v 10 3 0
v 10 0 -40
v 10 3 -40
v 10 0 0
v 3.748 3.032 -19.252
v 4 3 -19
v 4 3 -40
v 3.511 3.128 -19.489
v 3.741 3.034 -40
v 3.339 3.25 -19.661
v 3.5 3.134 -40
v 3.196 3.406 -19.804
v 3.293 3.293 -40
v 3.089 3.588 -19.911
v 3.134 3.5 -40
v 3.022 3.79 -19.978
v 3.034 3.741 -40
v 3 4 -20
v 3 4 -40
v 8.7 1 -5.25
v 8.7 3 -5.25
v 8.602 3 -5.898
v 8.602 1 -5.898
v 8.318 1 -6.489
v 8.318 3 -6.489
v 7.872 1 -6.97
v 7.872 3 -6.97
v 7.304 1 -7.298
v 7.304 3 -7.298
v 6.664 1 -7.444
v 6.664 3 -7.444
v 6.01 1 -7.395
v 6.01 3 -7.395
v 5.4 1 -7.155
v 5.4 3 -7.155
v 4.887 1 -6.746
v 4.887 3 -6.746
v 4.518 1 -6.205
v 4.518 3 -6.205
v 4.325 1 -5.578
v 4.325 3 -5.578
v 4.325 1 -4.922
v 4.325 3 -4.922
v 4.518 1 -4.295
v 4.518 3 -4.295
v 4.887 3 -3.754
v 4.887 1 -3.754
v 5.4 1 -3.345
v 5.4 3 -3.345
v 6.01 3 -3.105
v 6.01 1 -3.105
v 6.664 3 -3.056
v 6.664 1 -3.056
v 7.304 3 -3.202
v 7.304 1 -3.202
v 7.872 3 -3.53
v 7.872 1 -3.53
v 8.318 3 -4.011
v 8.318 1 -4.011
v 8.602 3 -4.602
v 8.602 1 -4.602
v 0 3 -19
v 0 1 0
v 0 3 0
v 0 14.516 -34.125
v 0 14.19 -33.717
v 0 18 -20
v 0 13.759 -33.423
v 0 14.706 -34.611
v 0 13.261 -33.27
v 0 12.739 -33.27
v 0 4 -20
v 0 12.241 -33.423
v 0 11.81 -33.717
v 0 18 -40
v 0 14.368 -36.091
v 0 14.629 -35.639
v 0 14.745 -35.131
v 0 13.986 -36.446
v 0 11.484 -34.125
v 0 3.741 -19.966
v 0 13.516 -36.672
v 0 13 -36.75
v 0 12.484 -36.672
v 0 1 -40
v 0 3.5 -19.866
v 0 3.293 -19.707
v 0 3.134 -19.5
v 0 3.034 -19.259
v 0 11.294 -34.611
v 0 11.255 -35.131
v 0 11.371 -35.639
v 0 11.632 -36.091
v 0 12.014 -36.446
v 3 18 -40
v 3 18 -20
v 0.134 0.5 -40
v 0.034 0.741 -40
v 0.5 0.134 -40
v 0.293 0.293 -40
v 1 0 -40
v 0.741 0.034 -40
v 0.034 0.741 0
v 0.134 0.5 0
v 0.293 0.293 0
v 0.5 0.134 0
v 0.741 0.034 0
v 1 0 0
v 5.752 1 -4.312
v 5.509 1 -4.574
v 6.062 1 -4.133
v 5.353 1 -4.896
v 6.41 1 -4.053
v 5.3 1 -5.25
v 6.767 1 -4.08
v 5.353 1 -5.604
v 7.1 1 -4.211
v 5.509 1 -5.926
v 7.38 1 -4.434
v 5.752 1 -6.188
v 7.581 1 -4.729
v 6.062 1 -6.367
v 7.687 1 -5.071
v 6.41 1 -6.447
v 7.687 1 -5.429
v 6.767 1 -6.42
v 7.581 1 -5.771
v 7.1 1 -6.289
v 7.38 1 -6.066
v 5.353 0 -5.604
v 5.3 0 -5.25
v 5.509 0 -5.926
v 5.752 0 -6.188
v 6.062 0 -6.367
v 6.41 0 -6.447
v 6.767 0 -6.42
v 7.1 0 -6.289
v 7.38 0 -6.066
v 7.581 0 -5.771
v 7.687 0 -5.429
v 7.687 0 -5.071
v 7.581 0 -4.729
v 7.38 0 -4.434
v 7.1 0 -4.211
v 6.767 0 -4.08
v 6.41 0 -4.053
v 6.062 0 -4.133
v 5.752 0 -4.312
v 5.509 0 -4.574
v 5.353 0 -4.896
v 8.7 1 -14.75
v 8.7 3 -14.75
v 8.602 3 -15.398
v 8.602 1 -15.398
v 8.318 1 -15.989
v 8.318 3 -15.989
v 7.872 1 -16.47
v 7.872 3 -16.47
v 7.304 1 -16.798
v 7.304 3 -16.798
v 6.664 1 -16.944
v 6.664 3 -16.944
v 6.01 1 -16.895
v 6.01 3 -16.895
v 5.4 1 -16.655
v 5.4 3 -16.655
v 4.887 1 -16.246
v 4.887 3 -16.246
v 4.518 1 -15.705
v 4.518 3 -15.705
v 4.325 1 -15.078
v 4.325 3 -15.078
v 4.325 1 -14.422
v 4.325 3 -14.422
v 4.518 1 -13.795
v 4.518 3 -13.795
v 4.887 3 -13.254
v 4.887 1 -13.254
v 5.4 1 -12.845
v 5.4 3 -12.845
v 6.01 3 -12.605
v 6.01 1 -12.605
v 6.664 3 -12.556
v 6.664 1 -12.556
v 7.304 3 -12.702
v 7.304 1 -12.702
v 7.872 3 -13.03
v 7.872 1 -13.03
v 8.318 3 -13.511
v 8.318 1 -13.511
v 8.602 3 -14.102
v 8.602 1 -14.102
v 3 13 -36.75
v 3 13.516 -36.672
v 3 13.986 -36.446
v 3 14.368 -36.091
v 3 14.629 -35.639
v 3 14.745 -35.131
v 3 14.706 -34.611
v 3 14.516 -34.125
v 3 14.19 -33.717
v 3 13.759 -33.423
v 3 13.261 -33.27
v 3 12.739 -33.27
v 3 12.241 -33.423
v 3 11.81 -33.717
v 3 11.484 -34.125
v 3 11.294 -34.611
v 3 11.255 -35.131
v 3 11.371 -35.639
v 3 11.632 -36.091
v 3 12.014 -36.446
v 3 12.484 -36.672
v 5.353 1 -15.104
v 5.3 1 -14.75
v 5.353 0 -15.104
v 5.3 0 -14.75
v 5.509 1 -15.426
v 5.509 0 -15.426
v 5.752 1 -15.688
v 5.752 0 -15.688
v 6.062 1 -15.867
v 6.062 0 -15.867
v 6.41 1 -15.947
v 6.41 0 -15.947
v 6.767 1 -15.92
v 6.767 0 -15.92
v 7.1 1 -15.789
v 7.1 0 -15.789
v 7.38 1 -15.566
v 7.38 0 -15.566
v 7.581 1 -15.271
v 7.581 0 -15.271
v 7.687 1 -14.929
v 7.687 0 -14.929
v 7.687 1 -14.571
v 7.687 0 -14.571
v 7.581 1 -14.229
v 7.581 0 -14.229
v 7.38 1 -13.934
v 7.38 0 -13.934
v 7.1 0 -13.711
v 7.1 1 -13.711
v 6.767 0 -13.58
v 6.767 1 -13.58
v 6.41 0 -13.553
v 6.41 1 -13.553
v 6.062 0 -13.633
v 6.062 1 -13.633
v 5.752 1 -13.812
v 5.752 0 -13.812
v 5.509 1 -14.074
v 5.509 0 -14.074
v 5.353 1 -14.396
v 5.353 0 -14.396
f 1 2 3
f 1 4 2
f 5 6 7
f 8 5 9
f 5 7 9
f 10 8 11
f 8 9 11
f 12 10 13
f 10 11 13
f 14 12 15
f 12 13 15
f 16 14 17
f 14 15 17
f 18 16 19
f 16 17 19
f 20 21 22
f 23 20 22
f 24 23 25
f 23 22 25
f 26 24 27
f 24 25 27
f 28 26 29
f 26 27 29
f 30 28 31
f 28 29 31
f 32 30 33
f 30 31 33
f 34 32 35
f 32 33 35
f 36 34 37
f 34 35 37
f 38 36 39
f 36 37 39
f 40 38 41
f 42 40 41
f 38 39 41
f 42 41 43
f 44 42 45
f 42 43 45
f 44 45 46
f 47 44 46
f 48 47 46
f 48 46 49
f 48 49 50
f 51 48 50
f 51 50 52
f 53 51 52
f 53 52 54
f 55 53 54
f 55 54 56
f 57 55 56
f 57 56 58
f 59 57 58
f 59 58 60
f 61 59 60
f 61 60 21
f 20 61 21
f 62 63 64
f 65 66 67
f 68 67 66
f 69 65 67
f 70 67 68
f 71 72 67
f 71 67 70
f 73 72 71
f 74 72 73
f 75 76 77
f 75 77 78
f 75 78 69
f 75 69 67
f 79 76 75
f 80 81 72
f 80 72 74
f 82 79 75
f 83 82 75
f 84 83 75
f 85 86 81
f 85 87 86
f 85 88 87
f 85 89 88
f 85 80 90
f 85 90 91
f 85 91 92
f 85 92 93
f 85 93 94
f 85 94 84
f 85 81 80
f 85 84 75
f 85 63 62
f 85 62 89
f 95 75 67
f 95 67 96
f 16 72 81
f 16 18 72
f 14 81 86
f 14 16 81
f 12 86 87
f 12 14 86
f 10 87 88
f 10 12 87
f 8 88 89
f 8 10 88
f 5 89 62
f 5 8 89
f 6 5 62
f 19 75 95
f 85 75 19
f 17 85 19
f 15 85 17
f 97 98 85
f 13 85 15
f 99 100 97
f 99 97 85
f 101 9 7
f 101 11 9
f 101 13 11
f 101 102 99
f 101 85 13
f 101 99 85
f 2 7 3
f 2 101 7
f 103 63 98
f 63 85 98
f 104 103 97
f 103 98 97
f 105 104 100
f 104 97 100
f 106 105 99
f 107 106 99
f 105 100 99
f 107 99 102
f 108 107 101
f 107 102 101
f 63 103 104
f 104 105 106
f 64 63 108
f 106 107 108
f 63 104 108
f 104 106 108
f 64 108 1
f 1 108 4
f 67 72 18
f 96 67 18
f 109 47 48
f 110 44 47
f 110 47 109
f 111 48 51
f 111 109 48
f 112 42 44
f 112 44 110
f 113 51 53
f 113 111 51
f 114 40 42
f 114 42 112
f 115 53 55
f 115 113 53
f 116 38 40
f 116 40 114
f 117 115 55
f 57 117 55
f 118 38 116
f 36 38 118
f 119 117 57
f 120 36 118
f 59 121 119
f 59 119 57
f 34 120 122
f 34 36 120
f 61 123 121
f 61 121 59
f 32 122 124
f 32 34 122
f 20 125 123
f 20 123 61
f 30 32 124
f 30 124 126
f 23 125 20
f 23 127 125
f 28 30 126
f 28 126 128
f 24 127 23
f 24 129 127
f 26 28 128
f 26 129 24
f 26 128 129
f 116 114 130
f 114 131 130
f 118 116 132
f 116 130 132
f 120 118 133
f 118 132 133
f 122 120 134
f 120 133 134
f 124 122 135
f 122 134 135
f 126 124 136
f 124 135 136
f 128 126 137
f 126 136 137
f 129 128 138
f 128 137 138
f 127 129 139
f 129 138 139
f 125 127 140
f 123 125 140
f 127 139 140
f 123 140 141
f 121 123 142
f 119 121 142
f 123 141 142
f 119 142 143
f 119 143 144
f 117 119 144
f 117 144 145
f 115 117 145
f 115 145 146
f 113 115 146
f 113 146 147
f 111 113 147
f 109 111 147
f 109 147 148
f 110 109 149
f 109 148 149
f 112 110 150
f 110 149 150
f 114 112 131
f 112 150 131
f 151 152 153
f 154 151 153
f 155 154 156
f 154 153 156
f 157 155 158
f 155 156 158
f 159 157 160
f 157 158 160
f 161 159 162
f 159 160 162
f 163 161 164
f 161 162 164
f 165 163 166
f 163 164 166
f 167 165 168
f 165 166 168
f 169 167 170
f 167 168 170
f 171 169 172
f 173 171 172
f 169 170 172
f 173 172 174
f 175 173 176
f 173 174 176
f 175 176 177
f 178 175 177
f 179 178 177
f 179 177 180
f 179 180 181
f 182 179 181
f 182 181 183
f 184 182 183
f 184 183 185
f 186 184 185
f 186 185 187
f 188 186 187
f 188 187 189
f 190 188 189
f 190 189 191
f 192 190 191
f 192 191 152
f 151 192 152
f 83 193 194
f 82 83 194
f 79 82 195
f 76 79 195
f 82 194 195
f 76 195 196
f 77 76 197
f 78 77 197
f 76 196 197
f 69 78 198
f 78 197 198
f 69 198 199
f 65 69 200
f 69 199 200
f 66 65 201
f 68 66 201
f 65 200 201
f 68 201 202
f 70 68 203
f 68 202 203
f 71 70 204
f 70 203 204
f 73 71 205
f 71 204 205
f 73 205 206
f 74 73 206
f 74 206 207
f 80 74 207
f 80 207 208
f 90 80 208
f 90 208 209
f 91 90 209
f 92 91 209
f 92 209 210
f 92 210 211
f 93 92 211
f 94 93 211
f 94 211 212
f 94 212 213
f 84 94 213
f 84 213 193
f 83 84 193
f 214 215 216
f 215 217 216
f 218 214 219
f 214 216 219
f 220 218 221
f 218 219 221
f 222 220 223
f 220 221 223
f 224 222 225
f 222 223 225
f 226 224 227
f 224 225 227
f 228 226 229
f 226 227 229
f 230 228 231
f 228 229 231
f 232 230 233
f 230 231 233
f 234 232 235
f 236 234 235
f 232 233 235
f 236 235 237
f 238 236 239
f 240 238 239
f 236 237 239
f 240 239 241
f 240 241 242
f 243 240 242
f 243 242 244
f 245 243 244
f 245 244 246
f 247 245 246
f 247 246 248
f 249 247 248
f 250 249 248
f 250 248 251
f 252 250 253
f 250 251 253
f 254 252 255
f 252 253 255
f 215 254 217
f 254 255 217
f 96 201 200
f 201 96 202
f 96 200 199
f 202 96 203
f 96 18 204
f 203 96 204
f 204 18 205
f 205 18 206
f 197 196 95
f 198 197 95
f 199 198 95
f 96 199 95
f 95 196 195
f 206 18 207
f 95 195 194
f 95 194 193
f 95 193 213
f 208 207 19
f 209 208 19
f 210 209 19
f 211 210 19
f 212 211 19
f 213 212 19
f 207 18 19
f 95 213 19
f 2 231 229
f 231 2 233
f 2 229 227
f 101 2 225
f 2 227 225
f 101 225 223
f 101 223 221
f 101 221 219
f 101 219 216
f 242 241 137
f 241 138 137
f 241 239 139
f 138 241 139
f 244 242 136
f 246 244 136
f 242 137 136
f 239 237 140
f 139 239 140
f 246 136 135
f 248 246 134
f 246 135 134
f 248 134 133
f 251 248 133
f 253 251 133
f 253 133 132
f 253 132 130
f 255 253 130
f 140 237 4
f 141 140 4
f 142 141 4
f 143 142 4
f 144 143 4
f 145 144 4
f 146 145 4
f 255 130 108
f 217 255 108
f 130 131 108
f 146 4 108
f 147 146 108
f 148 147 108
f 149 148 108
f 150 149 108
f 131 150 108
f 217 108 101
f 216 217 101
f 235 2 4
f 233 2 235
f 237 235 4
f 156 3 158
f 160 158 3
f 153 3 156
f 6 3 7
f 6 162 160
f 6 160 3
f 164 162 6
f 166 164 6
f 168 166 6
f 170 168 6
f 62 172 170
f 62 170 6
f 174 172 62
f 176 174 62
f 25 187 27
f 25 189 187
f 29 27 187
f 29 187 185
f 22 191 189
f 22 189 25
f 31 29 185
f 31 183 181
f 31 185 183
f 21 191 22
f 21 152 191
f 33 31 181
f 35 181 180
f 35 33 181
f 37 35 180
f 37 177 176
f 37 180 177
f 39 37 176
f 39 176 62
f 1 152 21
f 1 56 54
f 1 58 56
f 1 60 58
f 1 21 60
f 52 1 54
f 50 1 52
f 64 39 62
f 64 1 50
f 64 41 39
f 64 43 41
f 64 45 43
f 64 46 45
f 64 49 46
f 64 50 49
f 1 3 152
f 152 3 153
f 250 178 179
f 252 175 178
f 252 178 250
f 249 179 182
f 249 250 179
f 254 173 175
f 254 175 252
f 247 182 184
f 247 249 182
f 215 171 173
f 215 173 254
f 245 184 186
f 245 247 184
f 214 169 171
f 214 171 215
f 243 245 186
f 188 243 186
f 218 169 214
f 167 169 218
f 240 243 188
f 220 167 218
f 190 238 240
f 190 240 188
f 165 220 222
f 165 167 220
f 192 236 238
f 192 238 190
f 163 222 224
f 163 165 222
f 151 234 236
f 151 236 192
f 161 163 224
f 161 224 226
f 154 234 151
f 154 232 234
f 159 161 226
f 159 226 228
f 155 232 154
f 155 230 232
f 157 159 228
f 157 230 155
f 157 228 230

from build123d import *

# Parameters (mm, degrees)
SKETCH1_W                      = 10
SKETCH1_H                      = 20
SKETCH1_R                      = 1.175
BOSS_EXTRUDE1_DEPTH            = 3
CBORE_FOR_M2_SHCS1_D           = 2.4
CBORE_FOR_M2_SHCS1_CBORE_D     = 4.4
CBORE_FOR_M2_SHCS1_CBORE_DEPTH = 2
SKETCH6_W                      = 10
SKETCH6_H                      = 3
BOSS_EXTRUDE2_DEPTH            = 20
SKETCH8_W                      = 3
SKETCH8_H                      = 20
BOSS_EXTRUDE3_DEPTH            = 15
SKETCH9_R                      = 1.75
CUT_EXTRUDE1_DEPTH             = 45.418464629
FILLET1_R                      = 1
FILLET2_R                      = 1


with BuildPart() as part:
    # Sketch1 → Boss-Extrude1 (new body)
    with BuildSketch(Plane(origin=(0, 0, 0), x_dir=(1, 0, 0), z_dir=(0, 1, 0))):
        with Locations((5, 10)):
            Rectangle(SKETCH1_W, SKETCH1_H)
        with Locations(Location((6.5, 5.25, 0), (0, 0, 270))):
            Circle(SKETCH1_R, mode=Mode.SUBTRACT)
        with Locations(Location((6.5, 14.75, 0), (0, 0, 270))):
            Circle(SKETCH1_R, mode=Mode.SUBTRACT)
    extrude(amount=BOSS_EXTRUDE1_DEPTH)

    # CBORE for M2 SHCS1 (through all)
    with Locations(Plane(origin=(0, 3, 0), x_dir=(1, 0, 0), z_dir=(0, 1, 0))):
        with Locations((6.5, 14.75), (6.5, 5.25)):
            CounterBoreHole(CBORE_FOR_M2_SHCS1_D / 2, CBORE_FOR_M2_SHCS1_CBORE_D / 2, CBORE_FOR_M2_SHCS1_CBORE_DEPTH)

    # Sketch6 → Boss-Extrude2 (add)
    with BuildSketch(Plane(origin=(0, 0, -20), x_dir=(-1, 0, 0), z_dir=(0, 0, -1))):
        with Locations((-5, 1.5)):
            Rectangle(SKETCH6_W, SKETCH6_H)
    extrude(amount=BOSS_EXTRUDE2_DEPTH)

    # Sketch8 → Boss-Extrude3 (add)
    with BuildSketch(Plane(origin=(0, 3, 0), x_dir=(1, 0, 0), z_dir=(0, 1, 0))):
        with Locations((1.5, 30)):
            Rectangle(SKETCH8_W, SKETCH8_H)
    extrude(amount=BOSS_EXTRUDE3_DEPTH)

    # Sketch9 → Cut-Extrude1 (cut, through all)
    with BuildSketch(Plane(origin=(3, 0, 0), x_dir=(0, 0, -1), z_dir=(1, 0, 0))):
        with Locations((35, 13)):
            Circle(SKETCH9_R)
    extrude(amount=-CUT_EXTRUDE1_DEPTH, mode=Mode.SUBTRACT)

    # Fillet1
    fillet1_edges = [part.edges().sort_by_distance(p)[0] for p in [
        (1.5, 3, -20),
        (3, 3, -30),
    ]]
    fillet(fillet1_edges, radius=FILLET1_R)

    # Fillet2
    fillet2_edges = [part.edges().sort_by_distance(p)[0] for p in [
        (0, 0, -20),
    ]]
    fillet(fillet2_edges, radius=FILLET2_R)


solid = part.part
